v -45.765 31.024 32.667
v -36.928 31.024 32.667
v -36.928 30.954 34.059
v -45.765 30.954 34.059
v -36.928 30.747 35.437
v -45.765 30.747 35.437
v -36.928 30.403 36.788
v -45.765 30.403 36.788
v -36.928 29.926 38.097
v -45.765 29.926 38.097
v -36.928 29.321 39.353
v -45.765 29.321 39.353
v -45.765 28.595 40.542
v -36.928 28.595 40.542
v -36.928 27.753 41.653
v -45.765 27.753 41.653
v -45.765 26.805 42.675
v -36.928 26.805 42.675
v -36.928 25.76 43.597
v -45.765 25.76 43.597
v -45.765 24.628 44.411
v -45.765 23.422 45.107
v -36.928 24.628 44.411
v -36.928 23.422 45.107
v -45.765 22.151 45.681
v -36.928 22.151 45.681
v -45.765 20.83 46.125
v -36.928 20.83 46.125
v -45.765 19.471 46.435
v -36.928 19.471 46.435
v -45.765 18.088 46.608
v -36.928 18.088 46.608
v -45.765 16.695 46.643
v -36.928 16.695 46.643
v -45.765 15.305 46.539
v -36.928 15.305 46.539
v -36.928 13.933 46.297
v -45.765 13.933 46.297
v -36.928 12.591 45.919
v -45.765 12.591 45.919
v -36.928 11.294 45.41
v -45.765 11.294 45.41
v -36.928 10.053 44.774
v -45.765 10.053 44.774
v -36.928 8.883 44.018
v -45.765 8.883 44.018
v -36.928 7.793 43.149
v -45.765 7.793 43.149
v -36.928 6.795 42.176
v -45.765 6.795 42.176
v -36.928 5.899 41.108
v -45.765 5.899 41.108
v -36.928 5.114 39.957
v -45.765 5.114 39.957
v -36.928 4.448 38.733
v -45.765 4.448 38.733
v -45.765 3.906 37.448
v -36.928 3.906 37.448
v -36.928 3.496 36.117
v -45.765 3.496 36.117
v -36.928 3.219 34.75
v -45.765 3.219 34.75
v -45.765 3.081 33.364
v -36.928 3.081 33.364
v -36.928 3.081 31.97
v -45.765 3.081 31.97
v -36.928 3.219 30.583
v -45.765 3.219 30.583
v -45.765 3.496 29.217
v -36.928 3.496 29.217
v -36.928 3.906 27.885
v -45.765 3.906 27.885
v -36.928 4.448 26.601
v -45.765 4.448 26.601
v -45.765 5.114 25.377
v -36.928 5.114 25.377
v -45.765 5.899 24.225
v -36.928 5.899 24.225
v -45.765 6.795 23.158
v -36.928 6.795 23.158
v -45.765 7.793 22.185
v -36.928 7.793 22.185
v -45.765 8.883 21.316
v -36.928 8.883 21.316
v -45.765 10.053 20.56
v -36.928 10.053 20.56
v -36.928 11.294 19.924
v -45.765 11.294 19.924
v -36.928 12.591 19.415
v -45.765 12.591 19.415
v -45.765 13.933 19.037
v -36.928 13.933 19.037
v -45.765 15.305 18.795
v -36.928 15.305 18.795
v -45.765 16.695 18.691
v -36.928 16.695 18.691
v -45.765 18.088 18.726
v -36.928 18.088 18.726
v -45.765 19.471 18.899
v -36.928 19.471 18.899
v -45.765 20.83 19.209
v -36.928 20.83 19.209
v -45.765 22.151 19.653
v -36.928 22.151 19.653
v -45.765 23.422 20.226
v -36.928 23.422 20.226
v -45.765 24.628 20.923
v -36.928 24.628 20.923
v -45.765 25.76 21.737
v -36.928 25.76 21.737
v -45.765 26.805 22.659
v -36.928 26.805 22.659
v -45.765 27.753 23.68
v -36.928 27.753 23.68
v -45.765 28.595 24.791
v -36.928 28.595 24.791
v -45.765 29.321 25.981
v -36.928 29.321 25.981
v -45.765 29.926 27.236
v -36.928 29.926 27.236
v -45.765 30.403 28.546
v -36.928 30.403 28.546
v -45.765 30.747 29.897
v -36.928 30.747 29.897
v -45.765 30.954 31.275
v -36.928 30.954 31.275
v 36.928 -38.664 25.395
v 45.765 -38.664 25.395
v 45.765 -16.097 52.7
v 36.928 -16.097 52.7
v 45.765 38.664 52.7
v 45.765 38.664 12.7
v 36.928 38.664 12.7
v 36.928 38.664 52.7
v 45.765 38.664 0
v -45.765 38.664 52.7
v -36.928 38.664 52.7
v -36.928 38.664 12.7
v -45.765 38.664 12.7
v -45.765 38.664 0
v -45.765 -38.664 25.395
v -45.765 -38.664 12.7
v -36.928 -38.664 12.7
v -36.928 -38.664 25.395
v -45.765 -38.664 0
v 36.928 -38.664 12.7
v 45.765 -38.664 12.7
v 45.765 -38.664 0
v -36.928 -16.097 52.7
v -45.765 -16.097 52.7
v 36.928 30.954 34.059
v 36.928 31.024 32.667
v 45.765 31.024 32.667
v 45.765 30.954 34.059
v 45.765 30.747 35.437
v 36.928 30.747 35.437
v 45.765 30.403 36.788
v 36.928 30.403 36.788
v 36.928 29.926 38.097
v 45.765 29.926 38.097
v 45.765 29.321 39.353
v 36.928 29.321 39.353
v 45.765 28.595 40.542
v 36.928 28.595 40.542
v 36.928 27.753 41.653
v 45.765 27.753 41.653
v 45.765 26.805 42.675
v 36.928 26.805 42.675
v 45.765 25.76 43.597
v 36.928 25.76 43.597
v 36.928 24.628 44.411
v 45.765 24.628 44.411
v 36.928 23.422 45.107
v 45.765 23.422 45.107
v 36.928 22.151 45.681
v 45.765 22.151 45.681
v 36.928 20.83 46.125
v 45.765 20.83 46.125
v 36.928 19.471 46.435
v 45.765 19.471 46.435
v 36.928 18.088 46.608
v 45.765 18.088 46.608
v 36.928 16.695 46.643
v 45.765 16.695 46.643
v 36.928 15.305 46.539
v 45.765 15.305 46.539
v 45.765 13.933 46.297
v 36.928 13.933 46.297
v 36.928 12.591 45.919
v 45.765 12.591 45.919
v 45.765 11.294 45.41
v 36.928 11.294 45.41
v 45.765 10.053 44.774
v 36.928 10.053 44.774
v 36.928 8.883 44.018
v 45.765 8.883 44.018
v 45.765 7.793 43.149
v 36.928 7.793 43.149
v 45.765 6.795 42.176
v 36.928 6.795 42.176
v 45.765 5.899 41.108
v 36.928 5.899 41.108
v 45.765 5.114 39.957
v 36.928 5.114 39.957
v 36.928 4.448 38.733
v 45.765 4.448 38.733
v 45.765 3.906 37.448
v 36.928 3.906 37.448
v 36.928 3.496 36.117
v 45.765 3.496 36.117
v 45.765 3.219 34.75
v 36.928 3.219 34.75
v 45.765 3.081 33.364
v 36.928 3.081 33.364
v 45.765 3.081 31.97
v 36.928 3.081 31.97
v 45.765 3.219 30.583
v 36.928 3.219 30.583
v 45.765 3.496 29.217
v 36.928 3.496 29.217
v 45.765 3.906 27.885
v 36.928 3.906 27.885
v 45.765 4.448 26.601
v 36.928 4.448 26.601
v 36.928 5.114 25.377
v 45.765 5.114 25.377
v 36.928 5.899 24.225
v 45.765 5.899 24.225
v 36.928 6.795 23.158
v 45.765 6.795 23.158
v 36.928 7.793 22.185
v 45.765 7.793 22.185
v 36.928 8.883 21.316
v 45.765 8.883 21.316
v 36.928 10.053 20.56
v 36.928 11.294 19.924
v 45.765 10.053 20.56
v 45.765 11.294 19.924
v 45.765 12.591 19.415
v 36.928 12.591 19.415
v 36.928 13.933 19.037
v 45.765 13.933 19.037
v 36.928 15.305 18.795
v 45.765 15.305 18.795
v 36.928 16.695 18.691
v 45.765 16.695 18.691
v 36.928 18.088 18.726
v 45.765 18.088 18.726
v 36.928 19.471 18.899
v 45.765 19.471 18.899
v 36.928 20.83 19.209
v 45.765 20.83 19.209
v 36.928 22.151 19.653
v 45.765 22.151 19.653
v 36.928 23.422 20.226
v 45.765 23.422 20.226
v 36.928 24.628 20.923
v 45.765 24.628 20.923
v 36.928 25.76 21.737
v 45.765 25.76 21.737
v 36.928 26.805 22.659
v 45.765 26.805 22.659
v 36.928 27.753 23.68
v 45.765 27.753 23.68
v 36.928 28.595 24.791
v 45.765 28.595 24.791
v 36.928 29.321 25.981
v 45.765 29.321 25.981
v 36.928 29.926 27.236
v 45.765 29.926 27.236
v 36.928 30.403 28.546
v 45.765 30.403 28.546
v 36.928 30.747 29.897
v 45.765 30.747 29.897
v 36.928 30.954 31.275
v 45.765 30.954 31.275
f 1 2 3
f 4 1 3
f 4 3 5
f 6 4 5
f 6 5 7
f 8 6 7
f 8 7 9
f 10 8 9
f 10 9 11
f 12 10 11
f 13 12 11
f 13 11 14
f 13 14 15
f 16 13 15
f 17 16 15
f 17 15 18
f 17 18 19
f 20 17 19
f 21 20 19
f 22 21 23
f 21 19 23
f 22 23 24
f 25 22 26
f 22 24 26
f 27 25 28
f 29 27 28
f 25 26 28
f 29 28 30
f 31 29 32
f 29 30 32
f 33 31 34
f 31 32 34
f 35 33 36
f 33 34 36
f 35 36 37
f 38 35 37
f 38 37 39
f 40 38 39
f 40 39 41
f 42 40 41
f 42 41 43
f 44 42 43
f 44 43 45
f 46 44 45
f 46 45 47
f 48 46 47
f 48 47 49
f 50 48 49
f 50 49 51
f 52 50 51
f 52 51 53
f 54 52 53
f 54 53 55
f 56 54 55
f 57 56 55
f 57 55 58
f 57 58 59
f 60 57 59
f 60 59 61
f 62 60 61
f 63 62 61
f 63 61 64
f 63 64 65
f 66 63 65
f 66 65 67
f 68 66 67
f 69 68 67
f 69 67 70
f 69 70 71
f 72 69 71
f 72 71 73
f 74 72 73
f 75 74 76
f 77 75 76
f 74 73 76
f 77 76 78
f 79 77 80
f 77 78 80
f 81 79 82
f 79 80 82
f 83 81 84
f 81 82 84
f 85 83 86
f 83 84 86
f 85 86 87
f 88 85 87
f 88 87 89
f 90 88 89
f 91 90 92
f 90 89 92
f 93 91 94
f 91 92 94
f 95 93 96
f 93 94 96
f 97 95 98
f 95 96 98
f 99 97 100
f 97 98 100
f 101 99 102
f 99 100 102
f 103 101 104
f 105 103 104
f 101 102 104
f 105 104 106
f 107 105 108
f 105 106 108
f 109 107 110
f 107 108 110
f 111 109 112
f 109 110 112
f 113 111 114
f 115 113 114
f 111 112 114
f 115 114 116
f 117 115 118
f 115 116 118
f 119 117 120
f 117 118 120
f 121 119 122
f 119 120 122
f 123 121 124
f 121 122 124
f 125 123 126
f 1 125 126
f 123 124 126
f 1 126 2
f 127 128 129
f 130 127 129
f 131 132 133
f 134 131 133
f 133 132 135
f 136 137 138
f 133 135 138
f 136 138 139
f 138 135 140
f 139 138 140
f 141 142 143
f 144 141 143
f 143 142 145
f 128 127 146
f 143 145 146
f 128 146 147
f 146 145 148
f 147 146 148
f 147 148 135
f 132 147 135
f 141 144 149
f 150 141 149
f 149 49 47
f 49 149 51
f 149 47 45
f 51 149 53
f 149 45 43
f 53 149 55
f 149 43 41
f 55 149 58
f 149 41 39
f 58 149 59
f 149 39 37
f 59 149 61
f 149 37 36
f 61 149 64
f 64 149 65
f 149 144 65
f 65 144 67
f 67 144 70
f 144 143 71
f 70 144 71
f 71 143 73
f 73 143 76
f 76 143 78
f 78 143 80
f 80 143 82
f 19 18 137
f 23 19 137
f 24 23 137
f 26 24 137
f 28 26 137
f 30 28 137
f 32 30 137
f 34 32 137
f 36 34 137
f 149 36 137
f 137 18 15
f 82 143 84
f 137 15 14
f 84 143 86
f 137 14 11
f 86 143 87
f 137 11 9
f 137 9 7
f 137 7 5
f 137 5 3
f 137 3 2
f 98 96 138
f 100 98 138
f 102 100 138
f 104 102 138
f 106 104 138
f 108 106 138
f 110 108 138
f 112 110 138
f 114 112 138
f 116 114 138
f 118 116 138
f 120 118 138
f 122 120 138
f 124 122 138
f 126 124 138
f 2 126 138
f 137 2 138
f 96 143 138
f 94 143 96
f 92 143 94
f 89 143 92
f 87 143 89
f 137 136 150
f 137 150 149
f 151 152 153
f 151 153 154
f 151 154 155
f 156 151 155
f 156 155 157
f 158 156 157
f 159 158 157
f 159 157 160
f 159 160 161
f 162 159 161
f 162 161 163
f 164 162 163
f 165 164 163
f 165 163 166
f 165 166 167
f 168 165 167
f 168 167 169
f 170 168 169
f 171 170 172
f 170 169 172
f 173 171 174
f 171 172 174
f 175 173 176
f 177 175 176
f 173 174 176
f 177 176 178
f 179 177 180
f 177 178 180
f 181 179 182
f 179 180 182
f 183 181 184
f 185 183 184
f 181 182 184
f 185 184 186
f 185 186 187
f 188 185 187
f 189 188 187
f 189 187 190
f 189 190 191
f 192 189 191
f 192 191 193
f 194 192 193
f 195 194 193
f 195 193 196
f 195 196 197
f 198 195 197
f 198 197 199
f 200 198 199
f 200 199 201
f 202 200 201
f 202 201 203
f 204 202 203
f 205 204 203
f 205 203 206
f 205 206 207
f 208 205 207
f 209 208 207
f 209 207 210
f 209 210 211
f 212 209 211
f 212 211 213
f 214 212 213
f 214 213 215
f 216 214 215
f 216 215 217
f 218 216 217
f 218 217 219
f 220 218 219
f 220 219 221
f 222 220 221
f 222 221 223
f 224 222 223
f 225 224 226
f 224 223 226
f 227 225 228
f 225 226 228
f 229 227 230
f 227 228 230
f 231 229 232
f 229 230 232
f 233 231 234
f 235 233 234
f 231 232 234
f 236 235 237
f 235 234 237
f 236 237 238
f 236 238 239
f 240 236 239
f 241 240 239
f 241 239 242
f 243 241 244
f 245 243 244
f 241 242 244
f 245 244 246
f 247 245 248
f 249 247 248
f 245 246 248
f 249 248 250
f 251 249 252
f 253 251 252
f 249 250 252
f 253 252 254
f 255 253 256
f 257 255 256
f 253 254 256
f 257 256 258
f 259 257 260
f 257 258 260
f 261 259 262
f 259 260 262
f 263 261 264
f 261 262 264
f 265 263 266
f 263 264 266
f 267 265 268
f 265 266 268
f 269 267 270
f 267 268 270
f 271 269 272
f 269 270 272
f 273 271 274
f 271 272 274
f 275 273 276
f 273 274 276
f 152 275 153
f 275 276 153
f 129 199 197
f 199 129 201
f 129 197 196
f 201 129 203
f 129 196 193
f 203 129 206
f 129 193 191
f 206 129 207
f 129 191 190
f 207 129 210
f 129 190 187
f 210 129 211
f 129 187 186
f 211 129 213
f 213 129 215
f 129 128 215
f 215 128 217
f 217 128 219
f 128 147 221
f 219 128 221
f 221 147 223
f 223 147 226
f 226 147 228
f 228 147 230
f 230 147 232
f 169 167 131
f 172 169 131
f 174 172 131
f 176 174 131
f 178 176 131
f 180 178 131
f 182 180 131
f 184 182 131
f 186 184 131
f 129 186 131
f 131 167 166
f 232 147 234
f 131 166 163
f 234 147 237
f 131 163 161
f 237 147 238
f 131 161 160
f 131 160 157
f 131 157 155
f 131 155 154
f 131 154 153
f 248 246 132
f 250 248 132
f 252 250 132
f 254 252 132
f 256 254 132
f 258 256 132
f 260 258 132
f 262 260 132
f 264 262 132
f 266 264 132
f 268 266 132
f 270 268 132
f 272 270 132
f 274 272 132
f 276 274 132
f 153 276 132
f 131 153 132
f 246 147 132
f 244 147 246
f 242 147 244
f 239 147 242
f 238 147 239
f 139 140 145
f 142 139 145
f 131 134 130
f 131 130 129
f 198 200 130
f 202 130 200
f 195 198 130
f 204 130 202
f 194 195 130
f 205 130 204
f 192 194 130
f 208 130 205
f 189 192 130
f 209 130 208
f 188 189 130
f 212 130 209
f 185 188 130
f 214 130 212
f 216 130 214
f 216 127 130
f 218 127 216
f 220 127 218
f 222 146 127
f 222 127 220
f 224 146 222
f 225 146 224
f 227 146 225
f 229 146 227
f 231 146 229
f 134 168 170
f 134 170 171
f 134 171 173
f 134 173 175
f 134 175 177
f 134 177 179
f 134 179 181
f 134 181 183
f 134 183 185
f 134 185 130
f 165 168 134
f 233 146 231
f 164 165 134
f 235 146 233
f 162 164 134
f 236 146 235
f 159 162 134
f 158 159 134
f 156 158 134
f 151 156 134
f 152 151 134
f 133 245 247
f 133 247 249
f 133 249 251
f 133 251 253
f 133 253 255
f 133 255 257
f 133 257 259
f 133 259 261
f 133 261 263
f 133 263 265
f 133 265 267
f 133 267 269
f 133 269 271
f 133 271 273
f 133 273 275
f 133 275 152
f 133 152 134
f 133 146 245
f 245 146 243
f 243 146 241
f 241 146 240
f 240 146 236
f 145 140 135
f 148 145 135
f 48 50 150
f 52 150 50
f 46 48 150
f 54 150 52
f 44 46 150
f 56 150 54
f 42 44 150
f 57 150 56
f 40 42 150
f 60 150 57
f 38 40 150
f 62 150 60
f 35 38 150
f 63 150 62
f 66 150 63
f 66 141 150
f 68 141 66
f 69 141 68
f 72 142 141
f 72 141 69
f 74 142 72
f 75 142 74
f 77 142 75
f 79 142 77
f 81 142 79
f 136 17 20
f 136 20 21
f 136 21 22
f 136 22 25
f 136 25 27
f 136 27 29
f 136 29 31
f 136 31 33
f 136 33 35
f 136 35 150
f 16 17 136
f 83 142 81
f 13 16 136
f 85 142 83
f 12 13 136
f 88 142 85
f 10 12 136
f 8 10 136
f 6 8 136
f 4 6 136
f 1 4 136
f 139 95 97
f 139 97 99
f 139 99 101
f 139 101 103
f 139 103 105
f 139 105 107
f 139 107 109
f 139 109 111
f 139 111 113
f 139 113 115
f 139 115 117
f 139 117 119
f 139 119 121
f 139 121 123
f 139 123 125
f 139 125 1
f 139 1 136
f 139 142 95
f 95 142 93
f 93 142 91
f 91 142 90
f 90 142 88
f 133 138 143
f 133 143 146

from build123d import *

# Parameters (mm, degrees)
F1_DEPTH = 12.7
F2_W     = 8.837395
F2_H     = 77.327222
F3_DEPTH = 40
F4_R     = 13.98028
F5_DEPTH = 91.531181


with BuildPart() as f1:
    # F0 (on Top) → F1 (new body)
    with BuildSketch(Plane.XY):
        Polygon((-45.765091, 38.663611), (-45.765091, 0), (-45.765091, -38.663611), (0, -38.663611), (45.765091, -38.663611), (45.765091, 0), (45.765091, 38.663611), (0, 38.663611), align=None)
    extrude(amount=F1_DEPTH)

    # F2 (on face) → F3 (join)
    with BuildSketch(Plane.XY.offset(12.7)):
        with Locations((41.346393, 0)):
            Rectangle(F2_W, F2_H)
        with Locations((-41.346393, 0)):
            Rectangle(F2_W, F2_H)
    extrude(amount=F3_DEPTH)

    # F4 (on face) → F5 (cut, through all)
    with BuildSketch(Plane.YZ.offset(45.765091)):
        Polygon((-38.663611, 52.7), (-38.663611, 25.395), (-16.096687, 52.7), align=None)
        with Locations((17.04355, 32.666806)):
            Circle(F4_R)
    extrude(amount=-F5_DEPTH, mode=Mode.SUBTRACT)


solid = f1.part
